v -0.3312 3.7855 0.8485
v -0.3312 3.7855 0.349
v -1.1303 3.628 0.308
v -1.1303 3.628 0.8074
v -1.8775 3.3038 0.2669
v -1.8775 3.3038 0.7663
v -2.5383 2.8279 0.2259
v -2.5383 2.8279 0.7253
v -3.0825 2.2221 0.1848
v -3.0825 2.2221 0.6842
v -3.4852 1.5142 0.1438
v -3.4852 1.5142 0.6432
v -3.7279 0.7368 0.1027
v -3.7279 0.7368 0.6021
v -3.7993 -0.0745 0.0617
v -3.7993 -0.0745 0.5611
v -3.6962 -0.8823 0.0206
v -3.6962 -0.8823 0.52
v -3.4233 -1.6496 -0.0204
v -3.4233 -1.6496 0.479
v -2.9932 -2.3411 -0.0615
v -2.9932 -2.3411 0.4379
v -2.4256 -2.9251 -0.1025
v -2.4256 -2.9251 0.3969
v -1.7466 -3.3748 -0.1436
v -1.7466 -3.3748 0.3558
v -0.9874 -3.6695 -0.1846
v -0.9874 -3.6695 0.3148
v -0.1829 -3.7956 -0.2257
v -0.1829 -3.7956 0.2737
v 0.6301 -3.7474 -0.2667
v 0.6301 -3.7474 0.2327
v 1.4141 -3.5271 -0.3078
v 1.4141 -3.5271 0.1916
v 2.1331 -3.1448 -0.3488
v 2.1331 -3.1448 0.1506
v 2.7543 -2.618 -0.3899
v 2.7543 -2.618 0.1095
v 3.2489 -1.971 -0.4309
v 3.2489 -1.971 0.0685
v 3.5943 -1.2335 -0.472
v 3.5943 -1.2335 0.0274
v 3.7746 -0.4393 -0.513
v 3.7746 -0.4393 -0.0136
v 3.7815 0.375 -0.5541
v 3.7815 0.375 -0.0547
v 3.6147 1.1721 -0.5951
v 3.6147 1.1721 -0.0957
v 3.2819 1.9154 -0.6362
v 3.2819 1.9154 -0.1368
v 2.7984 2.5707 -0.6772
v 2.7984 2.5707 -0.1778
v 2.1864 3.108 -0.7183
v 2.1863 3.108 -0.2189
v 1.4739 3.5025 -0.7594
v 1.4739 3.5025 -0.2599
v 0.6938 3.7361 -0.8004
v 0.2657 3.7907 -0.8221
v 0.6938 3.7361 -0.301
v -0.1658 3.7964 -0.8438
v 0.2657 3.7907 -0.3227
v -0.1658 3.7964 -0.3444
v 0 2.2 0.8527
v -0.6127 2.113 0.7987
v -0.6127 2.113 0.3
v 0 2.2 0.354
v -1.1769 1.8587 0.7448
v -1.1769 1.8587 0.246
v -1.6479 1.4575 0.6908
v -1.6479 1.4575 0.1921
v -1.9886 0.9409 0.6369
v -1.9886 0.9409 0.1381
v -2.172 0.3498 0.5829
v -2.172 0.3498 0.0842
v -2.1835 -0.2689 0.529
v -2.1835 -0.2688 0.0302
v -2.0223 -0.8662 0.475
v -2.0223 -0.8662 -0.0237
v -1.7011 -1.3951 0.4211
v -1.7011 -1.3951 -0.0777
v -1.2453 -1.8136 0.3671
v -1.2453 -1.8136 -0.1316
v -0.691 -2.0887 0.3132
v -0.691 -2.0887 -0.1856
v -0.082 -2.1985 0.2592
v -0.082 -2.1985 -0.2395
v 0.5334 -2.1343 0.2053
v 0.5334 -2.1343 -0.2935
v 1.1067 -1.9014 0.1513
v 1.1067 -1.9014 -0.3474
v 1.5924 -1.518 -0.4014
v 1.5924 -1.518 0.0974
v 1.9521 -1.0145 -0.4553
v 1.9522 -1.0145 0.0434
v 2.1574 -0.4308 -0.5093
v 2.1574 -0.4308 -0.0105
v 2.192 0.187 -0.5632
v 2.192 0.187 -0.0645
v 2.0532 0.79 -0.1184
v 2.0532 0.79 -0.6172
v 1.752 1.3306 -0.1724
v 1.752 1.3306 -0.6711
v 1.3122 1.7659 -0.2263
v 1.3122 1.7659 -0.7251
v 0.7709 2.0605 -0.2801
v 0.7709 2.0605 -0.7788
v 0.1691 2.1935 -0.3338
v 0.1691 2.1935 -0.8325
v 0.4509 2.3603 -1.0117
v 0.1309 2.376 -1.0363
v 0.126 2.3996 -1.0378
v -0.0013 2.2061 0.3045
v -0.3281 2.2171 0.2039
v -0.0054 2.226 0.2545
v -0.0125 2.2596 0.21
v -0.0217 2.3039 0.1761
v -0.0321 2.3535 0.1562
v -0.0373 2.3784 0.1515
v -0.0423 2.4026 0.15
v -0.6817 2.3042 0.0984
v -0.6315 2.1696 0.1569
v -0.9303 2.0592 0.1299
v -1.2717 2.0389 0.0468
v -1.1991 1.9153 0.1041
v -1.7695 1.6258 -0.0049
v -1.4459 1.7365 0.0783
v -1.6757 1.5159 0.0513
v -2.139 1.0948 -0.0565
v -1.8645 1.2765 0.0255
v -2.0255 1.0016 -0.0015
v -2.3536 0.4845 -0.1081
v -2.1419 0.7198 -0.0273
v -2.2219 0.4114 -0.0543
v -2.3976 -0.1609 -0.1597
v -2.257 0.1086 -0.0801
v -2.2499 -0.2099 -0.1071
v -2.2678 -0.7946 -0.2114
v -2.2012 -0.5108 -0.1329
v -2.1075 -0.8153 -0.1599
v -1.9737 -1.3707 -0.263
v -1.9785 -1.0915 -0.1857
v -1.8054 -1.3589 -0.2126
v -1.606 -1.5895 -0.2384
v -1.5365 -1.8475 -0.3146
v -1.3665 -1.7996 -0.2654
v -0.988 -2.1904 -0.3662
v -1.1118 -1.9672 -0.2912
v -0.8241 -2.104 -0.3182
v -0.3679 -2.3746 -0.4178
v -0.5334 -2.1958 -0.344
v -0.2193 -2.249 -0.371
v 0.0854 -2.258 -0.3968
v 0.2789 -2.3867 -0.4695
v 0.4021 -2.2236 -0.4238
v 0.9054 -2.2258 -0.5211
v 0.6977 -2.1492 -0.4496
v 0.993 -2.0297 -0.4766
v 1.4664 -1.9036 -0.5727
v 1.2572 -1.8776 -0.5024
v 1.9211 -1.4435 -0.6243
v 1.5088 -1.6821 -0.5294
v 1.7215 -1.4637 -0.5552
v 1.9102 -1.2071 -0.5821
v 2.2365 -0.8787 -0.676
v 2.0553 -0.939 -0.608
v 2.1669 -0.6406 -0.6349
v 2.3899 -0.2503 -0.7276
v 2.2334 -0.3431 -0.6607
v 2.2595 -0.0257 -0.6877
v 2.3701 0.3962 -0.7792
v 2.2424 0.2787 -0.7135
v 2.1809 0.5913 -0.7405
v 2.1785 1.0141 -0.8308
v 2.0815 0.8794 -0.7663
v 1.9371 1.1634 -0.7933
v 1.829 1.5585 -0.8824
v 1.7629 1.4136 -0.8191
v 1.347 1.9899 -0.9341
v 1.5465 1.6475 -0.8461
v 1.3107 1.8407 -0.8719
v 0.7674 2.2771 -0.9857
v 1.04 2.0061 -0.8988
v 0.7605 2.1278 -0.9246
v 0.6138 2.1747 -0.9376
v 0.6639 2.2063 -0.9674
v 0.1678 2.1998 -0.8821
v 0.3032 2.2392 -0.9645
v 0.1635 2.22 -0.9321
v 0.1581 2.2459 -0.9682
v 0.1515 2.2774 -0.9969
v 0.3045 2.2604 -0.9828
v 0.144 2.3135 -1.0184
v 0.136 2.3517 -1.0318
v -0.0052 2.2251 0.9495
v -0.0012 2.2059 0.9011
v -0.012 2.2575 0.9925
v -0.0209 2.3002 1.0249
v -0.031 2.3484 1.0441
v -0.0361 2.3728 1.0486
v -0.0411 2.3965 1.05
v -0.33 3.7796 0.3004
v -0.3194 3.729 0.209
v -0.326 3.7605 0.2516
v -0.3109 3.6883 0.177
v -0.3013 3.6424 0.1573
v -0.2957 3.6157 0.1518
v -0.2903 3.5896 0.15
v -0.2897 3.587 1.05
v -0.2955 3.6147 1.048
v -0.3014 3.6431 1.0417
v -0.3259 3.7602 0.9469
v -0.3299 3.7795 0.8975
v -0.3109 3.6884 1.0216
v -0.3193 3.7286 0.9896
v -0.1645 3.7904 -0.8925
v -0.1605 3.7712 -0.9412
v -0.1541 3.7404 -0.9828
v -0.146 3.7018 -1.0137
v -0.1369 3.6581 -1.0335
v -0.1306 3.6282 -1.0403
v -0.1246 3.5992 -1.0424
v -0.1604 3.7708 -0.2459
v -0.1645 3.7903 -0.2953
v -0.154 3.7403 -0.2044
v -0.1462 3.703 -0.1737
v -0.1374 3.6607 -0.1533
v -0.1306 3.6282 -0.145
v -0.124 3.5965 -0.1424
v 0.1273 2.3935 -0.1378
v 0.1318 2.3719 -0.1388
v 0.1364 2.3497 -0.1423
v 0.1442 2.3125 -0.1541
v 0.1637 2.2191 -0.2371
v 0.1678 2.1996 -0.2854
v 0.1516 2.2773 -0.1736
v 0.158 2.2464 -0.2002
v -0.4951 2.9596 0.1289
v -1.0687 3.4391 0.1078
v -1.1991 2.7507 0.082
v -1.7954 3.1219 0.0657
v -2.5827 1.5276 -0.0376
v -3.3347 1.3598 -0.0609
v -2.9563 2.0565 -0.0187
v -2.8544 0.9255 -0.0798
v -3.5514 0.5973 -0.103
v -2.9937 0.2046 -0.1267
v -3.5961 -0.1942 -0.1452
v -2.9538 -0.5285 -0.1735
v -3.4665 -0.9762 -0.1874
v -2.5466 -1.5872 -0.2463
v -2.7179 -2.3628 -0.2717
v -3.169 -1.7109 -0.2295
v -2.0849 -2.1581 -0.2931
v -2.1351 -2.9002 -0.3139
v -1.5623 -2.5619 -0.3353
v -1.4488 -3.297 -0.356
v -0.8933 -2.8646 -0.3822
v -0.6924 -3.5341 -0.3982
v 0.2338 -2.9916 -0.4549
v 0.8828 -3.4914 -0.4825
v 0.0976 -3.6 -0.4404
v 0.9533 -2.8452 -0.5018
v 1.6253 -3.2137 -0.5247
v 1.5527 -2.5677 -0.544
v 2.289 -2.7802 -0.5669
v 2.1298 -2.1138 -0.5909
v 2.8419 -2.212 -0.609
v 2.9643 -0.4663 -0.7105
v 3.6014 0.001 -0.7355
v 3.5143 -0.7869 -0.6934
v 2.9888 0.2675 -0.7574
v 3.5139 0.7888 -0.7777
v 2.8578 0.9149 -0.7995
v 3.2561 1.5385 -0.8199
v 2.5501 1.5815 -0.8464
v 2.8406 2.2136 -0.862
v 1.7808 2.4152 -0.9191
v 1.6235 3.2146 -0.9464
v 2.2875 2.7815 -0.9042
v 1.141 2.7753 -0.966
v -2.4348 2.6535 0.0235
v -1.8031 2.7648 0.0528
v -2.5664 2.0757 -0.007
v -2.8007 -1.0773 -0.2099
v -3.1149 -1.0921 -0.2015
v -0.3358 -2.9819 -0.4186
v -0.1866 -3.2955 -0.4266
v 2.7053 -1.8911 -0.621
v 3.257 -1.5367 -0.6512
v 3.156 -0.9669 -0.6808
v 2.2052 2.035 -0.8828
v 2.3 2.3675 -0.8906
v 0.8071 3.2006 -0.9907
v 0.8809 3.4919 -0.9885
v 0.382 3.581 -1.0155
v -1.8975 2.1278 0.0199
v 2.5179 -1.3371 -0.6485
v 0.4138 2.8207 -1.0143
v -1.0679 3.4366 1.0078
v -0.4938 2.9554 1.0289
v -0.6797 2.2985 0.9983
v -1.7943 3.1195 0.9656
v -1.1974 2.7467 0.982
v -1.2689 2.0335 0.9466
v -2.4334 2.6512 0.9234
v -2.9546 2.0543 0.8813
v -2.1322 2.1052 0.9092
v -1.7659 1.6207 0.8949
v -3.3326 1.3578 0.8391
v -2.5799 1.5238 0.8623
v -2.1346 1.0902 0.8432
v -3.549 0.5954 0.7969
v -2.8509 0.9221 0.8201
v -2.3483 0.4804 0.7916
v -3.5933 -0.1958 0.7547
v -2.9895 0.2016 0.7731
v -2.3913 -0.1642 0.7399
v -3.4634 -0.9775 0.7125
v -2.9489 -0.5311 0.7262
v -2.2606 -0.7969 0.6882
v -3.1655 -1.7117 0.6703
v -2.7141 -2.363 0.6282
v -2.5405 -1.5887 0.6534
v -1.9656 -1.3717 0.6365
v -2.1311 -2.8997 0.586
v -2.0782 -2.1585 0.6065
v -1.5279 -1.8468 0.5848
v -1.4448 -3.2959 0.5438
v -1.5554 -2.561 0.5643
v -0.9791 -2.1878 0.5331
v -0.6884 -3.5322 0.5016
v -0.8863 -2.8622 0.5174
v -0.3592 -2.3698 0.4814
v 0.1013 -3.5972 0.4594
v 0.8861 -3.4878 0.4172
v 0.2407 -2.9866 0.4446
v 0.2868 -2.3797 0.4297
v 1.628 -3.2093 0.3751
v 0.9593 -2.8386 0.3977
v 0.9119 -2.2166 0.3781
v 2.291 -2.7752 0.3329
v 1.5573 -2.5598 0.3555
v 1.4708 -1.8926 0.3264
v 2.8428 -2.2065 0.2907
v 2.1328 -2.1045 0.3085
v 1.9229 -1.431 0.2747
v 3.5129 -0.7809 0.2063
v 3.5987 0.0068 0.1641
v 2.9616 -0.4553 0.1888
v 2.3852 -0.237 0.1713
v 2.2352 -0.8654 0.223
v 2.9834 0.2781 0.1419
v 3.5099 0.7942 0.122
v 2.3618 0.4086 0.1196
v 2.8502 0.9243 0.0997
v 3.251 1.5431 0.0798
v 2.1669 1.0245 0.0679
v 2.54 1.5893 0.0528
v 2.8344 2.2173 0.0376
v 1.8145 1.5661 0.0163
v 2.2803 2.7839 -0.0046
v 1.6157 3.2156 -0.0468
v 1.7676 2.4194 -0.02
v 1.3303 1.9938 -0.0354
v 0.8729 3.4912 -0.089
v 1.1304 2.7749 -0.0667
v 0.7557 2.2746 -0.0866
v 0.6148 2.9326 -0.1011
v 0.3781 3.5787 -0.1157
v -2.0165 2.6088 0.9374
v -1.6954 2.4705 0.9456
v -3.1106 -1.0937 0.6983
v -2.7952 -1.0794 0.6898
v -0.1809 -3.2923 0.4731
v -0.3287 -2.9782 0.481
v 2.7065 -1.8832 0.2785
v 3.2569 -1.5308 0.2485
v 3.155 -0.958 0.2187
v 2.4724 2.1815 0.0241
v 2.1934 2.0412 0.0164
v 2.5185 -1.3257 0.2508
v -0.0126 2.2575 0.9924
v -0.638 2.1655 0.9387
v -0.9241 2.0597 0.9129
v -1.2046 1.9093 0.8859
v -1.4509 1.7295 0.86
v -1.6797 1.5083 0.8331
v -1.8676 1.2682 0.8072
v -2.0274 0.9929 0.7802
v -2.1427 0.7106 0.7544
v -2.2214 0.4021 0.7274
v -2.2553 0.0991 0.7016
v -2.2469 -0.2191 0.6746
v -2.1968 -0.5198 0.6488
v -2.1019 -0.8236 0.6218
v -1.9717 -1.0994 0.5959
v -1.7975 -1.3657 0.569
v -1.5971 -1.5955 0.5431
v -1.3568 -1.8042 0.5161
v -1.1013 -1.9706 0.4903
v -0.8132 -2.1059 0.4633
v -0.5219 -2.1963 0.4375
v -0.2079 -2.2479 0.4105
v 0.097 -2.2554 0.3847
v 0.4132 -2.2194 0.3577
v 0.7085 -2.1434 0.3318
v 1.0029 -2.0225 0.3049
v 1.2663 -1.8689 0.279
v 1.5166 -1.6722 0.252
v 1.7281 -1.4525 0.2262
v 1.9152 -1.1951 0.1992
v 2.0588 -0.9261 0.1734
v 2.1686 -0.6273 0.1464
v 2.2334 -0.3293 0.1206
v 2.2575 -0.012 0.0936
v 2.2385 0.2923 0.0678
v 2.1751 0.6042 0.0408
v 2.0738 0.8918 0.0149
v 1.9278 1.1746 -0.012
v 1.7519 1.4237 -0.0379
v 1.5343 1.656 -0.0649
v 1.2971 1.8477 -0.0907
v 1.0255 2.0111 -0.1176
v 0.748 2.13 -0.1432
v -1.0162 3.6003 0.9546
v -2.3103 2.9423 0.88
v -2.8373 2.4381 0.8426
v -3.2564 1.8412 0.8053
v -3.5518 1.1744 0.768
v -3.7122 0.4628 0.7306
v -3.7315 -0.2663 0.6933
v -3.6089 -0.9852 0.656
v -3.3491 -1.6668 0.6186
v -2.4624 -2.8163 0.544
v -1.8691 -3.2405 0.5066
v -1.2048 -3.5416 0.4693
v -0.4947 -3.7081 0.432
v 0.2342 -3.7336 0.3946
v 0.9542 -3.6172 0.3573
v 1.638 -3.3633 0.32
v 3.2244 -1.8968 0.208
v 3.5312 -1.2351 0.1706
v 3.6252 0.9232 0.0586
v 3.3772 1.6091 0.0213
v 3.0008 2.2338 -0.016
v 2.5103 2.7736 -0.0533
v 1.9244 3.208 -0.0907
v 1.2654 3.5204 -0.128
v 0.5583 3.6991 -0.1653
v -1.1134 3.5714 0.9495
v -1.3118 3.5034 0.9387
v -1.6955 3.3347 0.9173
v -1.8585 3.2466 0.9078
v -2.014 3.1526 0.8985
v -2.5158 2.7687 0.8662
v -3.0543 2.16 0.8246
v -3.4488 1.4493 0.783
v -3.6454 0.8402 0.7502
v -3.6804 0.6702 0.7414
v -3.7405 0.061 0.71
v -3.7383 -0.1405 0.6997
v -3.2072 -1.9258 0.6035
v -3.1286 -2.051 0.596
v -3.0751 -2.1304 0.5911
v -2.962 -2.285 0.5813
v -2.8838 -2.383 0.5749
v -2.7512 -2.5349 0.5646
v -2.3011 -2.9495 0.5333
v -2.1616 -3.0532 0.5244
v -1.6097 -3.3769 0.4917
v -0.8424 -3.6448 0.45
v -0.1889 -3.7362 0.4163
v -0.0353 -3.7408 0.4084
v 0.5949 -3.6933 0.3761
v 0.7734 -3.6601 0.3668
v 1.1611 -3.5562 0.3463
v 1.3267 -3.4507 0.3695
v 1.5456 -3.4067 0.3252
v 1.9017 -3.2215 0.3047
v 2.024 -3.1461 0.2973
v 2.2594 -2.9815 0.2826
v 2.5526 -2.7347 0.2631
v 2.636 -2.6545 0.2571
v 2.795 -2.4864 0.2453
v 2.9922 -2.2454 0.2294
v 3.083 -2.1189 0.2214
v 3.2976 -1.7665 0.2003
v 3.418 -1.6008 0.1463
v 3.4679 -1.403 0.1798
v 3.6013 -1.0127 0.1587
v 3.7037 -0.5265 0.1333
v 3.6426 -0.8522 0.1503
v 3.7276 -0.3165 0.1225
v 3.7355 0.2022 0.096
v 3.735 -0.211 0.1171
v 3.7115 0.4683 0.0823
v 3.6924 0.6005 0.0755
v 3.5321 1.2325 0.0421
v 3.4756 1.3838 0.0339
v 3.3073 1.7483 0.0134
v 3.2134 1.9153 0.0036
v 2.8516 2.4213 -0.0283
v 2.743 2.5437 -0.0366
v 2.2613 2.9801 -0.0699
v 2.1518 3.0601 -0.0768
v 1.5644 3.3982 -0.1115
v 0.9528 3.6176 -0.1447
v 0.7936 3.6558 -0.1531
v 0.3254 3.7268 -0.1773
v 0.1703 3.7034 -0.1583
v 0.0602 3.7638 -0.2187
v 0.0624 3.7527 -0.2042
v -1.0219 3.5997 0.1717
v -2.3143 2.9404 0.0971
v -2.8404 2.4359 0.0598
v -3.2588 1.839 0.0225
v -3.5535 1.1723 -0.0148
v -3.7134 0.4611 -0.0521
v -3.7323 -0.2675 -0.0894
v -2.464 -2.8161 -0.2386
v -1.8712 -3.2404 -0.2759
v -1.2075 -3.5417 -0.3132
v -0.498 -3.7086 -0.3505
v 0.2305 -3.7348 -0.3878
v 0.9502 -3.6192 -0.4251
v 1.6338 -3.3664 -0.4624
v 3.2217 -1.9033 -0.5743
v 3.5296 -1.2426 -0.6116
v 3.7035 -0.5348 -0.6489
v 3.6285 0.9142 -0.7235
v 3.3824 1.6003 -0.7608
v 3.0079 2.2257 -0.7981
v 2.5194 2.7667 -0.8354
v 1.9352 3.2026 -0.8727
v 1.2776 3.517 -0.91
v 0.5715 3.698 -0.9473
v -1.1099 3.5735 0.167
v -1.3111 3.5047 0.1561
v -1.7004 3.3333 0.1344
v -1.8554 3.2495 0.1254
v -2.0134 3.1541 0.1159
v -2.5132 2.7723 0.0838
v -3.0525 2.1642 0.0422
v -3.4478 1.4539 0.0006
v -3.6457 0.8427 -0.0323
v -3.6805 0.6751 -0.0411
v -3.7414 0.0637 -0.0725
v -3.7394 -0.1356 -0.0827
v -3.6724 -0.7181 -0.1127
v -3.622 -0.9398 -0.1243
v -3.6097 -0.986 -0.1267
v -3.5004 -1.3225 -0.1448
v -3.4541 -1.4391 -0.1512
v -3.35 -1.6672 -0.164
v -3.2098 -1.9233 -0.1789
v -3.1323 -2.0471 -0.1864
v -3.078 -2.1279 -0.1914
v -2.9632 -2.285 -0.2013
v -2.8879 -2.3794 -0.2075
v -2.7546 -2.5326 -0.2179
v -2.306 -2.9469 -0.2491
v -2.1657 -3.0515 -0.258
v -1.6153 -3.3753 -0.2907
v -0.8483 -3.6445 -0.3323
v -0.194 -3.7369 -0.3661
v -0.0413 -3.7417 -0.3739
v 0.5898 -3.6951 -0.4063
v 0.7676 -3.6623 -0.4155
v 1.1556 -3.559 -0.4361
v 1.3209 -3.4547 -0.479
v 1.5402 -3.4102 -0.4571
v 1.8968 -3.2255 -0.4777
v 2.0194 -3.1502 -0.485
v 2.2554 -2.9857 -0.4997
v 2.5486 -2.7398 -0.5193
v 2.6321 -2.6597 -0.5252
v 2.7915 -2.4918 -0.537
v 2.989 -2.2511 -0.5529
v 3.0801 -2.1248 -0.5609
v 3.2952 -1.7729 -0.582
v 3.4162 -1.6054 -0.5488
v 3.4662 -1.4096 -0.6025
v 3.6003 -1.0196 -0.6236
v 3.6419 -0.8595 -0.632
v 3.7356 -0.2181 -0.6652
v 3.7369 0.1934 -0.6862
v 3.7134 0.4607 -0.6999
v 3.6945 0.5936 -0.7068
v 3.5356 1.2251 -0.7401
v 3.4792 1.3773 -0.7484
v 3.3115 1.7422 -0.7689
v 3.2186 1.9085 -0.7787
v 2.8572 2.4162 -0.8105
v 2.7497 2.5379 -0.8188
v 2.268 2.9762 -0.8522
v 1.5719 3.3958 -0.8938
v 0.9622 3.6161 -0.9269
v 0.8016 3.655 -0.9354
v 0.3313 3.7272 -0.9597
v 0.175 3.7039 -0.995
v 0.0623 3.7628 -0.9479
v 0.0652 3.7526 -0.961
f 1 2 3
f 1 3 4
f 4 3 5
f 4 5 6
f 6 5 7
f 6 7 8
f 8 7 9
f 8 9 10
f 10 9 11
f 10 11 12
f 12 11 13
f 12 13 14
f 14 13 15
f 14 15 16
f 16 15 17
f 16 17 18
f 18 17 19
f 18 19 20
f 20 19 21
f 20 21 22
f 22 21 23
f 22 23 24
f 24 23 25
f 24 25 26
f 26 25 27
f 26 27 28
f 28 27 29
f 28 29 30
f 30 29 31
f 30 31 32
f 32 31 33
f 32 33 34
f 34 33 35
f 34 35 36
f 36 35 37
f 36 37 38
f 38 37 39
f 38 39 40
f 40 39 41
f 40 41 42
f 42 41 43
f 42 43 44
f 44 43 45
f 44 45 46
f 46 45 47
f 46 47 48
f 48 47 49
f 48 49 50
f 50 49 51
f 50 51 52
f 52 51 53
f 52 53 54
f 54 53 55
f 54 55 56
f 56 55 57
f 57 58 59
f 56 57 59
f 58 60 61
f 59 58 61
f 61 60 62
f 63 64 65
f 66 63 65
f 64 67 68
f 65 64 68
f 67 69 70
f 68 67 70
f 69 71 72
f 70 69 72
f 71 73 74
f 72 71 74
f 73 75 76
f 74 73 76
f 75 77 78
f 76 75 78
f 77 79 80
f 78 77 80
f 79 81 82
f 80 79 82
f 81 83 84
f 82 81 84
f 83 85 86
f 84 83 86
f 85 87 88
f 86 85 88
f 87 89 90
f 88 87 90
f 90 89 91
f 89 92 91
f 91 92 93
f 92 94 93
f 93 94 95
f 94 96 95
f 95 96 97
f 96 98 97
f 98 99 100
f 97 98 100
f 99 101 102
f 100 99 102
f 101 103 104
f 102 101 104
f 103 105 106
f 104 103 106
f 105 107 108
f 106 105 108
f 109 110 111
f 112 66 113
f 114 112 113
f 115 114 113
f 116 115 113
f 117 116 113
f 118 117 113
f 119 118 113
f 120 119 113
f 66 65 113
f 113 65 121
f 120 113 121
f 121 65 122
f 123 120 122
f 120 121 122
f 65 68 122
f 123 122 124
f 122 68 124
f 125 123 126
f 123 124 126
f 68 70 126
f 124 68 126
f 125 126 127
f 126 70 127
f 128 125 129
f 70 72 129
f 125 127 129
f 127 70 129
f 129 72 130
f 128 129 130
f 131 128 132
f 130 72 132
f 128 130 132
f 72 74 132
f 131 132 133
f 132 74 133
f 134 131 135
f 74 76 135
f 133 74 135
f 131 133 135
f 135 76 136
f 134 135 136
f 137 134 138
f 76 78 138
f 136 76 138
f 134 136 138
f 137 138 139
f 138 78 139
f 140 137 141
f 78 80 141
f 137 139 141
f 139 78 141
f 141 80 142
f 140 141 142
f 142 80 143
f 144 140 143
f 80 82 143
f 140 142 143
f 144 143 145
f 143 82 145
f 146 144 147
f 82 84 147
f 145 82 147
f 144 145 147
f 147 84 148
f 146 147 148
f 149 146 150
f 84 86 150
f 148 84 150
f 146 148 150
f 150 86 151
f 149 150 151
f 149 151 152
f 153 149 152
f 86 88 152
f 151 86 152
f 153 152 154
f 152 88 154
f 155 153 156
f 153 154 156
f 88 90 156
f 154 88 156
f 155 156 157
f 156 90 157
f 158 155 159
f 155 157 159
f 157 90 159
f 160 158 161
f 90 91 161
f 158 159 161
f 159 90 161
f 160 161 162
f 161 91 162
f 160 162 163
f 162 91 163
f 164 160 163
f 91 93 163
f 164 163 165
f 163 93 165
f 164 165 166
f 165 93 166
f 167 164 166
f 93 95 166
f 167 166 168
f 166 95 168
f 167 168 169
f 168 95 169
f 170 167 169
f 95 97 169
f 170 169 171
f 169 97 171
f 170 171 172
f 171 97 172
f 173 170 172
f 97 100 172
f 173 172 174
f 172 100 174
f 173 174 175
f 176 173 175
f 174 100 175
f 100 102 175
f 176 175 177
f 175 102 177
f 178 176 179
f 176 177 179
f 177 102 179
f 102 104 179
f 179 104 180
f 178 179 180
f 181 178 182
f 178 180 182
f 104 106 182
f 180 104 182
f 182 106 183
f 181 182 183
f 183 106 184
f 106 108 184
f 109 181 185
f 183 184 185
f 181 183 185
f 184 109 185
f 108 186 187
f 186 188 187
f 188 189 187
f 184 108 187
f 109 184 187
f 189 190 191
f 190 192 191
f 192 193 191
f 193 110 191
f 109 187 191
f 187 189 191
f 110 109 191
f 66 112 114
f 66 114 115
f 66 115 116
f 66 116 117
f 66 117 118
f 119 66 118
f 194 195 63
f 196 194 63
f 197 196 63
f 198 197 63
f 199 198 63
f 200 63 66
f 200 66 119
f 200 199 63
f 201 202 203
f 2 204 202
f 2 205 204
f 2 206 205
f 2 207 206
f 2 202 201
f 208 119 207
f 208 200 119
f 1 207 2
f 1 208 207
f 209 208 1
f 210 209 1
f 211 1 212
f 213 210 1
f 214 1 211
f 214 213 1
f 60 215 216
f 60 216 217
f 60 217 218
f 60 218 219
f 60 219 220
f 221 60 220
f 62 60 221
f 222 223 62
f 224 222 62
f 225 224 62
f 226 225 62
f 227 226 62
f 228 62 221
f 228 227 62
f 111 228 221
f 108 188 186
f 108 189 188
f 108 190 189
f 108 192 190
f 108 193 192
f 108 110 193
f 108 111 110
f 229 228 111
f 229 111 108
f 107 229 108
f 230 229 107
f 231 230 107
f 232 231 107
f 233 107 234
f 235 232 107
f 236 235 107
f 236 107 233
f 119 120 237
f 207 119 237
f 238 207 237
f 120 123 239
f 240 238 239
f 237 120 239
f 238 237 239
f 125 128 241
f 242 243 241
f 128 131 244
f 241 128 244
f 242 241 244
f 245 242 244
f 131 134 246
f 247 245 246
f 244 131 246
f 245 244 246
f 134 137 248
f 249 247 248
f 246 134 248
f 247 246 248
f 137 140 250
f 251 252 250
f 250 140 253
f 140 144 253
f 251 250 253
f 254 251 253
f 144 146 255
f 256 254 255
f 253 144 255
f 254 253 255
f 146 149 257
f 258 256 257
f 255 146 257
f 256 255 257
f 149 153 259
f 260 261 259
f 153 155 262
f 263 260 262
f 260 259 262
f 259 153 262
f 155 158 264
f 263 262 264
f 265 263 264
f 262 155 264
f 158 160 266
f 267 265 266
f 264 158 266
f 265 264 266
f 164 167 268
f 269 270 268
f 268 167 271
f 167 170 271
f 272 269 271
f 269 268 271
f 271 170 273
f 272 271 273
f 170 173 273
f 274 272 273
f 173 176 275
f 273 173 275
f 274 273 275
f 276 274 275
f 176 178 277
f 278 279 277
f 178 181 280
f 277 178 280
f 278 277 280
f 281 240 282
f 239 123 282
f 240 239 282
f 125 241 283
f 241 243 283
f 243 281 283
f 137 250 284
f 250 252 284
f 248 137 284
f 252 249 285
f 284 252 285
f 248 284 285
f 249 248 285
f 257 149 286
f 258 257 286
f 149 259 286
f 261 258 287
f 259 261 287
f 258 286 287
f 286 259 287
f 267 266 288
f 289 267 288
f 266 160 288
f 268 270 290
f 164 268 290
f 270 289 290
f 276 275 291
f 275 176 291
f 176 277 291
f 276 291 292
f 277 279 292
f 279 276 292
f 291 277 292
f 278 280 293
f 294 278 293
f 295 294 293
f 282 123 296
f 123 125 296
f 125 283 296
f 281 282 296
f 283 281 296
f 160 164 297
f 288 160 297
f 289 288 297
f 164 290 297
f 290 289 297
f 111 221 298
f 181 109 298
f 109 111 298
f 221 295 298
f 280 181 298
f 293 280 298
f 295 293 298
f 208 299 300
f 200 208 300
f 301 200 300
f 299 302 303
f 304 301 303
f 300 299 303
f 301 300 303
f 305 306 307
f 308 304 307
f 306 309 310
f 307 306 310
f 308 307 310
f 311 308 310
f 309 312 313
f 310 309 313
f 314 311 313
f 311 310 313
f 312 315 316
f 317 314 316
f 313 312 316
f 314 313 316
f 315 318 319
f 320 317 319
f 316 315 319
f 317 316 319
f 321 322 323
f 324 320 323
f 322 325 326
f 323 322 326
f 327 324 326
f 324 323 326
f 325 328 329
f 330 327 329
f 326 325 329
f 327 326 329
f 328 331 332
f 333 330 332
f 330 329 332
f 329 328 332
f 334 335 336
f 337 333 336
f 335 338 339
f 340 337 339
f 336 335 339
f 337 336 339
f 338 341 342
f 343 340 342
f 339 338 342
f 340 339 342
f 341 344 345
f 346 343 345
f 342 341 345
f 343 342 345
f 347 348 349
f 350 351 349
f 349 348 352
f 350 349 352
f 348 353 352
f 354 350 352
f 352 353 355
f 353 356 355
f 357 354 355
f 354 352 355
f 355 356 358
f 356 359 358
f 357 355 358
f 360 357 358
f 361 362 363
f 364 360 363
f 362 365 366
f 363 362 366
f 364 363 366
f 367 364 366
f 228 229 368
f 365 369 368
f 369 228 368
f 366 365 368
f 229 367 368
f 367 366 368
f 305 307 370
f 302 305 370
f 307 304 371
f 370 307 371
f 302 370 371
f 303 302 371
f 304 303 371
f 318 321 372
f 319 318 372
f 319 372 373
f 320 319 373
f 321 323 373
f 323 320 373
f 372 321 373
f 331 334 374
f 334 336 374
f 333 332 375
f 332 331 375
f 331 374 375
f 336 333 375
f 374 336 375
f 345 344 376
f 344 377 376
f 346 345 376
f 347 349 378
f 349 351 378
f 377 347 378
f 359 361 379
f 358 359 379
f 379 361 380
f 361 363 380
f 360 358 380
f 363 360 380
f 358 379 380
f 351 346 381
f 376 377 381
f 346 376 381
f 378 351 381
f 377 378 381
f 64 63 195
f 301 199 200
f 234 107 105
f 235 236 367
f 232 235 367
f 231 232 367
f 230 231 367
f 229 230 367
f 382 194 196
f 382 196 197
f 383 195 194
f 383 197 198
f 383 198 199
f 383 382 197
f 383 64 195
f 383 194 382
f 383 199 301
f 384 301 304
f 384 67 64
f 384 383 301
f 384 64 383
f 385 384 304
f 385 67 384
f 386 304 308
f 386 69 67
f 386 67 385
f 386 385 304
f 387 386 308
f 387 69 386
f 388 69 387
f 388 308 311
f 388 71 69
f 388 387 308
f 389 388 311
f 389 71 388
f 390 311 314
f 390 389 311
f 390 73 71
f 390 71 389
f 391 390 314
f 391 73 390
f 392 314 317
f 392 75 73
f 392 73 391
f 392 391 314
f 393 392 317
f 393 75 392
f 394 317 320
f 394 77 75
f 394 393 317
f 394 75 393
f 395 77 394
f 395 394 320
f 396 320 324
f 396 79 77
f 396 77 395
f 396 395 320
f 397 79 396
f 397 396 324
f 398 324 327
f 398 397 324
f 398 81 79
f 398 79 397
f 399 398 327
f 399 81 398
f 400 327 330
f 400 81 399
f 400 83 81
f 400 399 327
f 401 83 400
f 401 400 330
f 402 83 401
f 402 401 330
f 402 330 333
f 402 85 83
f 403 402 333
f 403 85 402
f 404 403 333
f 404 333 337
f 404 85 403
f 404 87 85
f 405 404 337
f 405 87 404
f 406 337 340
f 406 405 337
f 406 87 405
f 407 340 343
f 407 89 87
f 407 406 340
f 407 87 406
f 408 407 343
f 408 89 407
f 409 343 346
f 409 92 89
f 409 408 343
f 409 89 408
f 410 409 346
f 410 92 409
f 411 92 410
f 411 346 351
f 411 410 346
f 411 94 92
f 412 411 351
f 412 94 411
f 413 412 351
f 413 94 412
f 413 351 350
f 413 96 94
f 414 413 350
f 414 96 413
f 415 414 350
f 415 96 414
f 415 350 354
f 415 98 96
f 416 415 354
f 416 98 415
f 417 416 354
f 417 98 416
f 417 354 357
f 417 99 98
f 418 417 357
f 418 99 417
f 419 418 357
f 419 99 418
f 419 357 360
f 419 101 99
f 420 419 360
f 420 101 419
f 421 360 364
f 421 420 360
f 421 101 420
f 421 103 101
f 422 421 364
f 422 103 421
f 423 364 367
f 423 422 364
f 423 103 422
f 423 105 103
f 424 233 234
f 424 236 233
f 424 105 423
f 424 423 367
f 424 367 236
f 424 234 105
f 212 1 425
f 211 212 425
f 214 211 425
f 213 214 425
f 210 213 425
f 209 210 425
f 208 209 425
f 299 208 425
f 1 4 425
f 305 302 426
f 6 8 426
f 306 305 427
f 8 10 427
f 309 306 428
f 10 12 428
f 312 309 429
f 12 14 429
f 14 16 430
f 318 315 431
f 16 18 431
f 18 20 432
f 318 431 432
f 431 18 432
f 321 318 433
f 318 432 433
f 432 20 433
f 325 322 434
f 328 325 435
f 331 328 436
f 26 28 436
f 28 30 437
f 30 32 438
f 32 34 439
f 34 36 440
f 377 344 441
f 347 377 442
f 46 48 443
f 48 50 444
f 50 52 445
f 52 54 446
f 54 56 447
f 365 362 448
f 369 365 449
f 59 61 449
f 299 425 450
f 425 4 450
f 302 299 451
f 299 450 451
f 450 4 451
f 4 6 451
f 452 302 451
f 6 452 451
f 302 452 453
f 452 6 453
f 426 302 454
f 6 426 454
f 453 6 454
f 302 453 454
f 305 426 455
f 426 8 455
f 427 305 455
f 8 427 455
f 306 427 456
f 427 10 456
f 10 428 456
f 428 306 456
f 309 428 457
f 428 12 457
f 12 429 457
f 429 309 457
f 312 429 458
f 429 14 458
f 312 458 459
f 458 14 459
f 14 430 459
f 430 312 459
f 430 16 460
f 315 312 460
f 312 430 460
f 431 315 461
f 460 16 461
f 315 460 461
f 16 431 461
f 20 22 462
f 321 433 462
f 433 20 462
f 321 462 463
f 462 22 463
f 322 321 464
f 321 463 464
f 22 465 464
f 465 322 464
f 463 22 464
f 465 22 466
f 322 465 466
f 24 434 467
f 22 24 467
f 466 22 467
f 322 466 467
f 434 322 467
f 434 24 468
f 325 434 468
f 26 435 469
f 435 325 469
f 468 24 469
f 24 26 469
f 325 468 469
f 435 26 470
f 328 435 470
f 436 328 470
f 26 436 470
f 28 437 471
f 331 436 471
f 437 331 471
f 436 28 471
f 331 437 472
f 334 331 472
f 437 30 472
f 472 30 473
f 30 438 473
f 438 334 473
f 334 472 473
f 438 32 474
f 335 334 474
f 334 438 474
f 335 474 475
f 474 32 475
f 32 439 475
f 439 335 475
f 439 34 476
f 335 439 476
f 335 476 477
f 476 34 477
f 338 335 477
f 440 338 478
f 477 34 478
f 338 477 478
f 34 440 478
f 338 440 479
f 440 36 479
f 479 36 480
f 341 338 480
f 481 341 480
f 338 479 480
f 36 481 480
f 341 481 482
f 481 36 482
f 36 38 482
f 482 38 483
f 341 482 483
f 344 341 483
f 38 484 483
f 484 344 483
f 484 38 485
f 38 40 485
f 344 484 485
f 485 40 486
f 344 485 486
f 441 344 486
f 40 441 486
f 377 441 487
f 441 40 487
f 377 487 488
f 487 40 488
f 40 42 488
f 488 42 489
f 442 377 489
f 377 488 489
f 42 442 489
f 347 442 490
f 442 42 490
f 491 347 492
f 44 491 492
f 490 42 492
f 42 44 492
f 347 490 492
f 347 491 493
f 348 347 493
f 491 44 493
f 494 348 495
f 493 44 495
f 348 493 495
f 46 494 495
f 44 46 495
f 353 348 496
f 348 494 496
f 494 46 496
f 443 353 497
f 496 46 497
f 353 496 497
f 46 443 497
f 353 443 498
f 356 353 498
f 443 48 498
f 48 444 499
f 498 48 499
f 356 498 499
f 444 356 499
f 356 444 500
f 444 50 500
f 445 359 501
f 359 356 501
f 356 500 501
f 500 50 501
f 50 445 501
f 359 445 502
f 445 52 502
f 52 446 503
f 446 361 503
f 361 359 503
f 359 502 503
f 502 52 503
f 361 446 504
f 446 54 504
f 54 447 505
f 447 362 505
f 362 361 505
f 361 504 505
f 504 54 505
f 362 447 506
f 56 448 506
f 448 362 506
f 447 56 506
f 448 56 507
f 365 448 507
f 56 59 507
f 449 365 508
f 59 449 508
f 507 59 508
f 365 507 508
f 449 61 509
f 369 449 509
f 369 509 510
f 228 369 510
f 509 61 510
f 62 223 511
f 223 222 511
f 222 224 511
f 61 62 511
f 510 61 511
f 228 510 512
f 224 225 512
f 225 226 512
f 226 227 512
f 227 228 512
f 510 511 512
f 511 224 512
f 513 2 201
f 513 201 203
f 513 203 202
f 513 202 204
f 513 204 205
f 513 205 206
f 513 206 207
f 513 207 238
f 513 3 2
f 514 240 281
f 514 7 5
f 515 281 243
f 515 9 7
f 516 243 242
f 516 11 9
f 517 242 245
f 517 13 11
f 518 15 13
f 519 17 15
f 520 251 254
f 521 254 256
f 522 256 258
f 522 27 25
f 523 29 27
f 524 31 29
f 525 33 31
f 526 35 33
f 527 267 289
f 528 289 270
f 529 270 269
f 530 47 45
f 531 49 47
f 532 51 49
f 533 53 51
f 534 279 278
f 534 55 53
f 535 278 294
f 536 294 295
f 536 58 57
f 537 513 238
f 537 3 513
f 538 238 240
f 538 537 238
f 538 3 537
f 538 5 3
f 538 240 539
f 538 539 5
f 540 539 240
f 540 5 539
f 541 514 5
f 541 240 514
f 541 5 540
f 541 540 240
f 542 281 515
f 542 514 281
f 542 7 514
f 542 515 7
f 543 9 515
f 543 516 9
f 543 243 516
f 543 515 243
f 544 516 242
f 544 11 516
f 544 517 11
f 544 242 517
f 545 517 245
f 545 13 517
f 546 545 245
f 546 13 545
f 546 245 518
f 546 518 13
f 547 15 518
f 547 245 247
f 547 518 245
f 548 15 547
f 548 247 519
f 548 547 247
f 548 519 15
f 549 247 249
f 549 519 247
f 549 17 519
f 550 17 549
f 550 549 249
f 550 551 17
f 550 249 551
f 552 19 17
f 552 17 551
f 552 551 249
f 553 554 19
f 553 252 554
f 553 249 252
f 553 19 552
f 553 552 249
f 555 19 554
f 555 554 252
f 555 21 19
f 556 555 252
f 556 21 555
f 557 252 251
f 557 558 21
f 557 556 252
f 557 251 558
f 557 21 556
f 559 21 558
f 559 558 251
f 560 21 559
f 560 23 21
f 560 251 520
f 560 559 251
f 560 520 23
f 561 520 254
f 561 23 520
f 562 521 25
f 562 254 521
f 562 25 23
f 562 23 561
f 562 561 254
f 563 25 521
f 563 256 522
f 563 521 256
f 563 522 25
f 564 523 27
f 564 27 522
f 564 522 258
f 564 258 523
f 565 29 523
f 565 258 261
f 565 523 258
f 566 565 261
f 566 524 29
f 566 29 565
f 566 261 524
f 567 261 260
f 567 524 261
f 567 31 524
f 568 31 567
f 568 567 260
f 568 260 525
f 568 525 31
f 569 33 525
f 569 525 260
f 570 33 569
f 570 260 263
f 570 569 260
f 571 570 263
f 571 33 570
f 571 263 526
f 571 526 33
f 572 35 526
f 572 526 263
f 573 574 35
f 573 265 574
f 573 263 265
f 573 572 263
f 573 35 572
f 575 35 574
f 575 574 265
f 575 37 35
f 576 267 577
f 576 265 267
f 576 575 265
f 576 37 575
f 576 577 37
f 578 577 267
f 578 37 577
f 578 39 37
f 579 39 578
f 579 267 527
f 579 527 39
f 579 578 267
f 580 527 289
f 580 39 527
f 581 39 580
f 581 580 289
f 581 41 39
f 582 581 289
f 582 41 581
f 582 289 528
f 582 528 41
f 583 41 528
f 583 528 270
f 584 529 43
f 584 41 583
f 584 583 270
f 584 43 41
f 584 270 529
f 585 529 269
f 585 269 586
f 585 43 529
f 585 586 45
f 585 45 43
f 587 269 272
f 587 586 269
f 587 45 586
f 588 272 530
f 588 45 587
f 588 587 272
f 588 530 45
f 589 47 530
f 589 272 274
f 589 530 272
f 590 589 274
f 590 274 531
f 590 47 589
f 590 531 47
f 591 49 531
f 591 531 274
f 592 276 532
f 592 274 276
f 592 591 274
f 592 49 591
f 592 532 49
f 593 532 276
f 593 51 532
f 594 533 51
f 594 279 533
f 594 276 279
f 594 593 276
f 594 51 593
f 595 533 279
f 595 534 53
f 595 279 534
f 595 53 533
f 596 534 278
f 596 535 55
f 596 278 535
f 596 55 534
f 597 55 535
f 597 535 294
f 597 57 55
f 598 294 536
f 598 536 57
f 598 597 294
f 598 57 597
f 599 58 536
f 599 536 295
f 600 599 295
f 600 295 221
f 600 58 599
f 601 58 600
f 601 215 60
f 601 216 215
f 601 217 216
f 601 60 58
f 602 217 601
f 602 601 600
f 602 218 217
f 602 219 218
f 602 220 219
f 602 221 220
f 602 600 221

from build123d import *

# Parameters (mm, degrees)
SWEEP1_PITCH       = 1.201201
SWEEP1_HEIGHT      = 1.2
SWEEP1_RADIUS      = 3.8
SWEEP1_START_ANGLE = 85
CUT_EXTRUDE1_DEPTH = 2.05
FILLET1_R          = 0.2


with BuildPart() as part:
    # Sweep1: sweep along a helix
    with BuildLine() as sweep1_path:
        add(Helix(SWEEP1_PITCH, SWEEP1_HEIGHT, SWEEP1_RADIUS, center=(0, 0, 0.6), direction=(0, 0, -1), lefthand=True, mode=Mode.PRIVATE).rotate(Axis((0, 0, 0.6), (0, 0, -1)), SWEEP1_START_ANGLE))
    # Sketch4 → Sweep1 (sweep)
    with BuildSketch(Plane(origin=(0.469922, -0.049692, 0.005065), x_dir=(0.007151, -0.034234, -0.999388), z_dir=(0.978873, 0.20447, 0))):
        Polygon((-1.181321, 3.879066), (-0.281871, 3.910542), (-0.225223, 2.291772), (-1.124673, 2.260297), align=None)
    sweep(path=sweep1_path.line, is_frenet=True)

    # Sketch5 → Cut-Extrude1 (cut, through all)
    with BuildSketch(Plane.XY):
        with BuildLine():
            Line((0, 2.2), (-0.331192, 3.78554))
            ThreePointArc((-0.331192, 3.78554), (-0.248532, 3.791864), (-0.165754, 3.796383))
            Line((-0.165754, 3.796383), (0.169062, 2.193494))
            ThreePointArc((0.169062, 2.193494), (0.084594, 2.198373), (0, 2.2))
        make_face()
    extrude(amount=-CUT_EXTRUDE1_DEPTH, mode=Mode.SUBTRACT)

    # Fillet1
    fillet1_edges = [part.edges().sort_by_distance(p)[0] for p in [
        (0.248532, -3.79186, 0.45357),
        (0.248532, -3.79186, -0.44643),
        (-0.084593, -2.198371, 0.456752),
        (-0.084593, -2.198371, -0.443248),
    ]]
    fillet(fillet1_edges, radius=FILLET1_R)


solid = part.part
